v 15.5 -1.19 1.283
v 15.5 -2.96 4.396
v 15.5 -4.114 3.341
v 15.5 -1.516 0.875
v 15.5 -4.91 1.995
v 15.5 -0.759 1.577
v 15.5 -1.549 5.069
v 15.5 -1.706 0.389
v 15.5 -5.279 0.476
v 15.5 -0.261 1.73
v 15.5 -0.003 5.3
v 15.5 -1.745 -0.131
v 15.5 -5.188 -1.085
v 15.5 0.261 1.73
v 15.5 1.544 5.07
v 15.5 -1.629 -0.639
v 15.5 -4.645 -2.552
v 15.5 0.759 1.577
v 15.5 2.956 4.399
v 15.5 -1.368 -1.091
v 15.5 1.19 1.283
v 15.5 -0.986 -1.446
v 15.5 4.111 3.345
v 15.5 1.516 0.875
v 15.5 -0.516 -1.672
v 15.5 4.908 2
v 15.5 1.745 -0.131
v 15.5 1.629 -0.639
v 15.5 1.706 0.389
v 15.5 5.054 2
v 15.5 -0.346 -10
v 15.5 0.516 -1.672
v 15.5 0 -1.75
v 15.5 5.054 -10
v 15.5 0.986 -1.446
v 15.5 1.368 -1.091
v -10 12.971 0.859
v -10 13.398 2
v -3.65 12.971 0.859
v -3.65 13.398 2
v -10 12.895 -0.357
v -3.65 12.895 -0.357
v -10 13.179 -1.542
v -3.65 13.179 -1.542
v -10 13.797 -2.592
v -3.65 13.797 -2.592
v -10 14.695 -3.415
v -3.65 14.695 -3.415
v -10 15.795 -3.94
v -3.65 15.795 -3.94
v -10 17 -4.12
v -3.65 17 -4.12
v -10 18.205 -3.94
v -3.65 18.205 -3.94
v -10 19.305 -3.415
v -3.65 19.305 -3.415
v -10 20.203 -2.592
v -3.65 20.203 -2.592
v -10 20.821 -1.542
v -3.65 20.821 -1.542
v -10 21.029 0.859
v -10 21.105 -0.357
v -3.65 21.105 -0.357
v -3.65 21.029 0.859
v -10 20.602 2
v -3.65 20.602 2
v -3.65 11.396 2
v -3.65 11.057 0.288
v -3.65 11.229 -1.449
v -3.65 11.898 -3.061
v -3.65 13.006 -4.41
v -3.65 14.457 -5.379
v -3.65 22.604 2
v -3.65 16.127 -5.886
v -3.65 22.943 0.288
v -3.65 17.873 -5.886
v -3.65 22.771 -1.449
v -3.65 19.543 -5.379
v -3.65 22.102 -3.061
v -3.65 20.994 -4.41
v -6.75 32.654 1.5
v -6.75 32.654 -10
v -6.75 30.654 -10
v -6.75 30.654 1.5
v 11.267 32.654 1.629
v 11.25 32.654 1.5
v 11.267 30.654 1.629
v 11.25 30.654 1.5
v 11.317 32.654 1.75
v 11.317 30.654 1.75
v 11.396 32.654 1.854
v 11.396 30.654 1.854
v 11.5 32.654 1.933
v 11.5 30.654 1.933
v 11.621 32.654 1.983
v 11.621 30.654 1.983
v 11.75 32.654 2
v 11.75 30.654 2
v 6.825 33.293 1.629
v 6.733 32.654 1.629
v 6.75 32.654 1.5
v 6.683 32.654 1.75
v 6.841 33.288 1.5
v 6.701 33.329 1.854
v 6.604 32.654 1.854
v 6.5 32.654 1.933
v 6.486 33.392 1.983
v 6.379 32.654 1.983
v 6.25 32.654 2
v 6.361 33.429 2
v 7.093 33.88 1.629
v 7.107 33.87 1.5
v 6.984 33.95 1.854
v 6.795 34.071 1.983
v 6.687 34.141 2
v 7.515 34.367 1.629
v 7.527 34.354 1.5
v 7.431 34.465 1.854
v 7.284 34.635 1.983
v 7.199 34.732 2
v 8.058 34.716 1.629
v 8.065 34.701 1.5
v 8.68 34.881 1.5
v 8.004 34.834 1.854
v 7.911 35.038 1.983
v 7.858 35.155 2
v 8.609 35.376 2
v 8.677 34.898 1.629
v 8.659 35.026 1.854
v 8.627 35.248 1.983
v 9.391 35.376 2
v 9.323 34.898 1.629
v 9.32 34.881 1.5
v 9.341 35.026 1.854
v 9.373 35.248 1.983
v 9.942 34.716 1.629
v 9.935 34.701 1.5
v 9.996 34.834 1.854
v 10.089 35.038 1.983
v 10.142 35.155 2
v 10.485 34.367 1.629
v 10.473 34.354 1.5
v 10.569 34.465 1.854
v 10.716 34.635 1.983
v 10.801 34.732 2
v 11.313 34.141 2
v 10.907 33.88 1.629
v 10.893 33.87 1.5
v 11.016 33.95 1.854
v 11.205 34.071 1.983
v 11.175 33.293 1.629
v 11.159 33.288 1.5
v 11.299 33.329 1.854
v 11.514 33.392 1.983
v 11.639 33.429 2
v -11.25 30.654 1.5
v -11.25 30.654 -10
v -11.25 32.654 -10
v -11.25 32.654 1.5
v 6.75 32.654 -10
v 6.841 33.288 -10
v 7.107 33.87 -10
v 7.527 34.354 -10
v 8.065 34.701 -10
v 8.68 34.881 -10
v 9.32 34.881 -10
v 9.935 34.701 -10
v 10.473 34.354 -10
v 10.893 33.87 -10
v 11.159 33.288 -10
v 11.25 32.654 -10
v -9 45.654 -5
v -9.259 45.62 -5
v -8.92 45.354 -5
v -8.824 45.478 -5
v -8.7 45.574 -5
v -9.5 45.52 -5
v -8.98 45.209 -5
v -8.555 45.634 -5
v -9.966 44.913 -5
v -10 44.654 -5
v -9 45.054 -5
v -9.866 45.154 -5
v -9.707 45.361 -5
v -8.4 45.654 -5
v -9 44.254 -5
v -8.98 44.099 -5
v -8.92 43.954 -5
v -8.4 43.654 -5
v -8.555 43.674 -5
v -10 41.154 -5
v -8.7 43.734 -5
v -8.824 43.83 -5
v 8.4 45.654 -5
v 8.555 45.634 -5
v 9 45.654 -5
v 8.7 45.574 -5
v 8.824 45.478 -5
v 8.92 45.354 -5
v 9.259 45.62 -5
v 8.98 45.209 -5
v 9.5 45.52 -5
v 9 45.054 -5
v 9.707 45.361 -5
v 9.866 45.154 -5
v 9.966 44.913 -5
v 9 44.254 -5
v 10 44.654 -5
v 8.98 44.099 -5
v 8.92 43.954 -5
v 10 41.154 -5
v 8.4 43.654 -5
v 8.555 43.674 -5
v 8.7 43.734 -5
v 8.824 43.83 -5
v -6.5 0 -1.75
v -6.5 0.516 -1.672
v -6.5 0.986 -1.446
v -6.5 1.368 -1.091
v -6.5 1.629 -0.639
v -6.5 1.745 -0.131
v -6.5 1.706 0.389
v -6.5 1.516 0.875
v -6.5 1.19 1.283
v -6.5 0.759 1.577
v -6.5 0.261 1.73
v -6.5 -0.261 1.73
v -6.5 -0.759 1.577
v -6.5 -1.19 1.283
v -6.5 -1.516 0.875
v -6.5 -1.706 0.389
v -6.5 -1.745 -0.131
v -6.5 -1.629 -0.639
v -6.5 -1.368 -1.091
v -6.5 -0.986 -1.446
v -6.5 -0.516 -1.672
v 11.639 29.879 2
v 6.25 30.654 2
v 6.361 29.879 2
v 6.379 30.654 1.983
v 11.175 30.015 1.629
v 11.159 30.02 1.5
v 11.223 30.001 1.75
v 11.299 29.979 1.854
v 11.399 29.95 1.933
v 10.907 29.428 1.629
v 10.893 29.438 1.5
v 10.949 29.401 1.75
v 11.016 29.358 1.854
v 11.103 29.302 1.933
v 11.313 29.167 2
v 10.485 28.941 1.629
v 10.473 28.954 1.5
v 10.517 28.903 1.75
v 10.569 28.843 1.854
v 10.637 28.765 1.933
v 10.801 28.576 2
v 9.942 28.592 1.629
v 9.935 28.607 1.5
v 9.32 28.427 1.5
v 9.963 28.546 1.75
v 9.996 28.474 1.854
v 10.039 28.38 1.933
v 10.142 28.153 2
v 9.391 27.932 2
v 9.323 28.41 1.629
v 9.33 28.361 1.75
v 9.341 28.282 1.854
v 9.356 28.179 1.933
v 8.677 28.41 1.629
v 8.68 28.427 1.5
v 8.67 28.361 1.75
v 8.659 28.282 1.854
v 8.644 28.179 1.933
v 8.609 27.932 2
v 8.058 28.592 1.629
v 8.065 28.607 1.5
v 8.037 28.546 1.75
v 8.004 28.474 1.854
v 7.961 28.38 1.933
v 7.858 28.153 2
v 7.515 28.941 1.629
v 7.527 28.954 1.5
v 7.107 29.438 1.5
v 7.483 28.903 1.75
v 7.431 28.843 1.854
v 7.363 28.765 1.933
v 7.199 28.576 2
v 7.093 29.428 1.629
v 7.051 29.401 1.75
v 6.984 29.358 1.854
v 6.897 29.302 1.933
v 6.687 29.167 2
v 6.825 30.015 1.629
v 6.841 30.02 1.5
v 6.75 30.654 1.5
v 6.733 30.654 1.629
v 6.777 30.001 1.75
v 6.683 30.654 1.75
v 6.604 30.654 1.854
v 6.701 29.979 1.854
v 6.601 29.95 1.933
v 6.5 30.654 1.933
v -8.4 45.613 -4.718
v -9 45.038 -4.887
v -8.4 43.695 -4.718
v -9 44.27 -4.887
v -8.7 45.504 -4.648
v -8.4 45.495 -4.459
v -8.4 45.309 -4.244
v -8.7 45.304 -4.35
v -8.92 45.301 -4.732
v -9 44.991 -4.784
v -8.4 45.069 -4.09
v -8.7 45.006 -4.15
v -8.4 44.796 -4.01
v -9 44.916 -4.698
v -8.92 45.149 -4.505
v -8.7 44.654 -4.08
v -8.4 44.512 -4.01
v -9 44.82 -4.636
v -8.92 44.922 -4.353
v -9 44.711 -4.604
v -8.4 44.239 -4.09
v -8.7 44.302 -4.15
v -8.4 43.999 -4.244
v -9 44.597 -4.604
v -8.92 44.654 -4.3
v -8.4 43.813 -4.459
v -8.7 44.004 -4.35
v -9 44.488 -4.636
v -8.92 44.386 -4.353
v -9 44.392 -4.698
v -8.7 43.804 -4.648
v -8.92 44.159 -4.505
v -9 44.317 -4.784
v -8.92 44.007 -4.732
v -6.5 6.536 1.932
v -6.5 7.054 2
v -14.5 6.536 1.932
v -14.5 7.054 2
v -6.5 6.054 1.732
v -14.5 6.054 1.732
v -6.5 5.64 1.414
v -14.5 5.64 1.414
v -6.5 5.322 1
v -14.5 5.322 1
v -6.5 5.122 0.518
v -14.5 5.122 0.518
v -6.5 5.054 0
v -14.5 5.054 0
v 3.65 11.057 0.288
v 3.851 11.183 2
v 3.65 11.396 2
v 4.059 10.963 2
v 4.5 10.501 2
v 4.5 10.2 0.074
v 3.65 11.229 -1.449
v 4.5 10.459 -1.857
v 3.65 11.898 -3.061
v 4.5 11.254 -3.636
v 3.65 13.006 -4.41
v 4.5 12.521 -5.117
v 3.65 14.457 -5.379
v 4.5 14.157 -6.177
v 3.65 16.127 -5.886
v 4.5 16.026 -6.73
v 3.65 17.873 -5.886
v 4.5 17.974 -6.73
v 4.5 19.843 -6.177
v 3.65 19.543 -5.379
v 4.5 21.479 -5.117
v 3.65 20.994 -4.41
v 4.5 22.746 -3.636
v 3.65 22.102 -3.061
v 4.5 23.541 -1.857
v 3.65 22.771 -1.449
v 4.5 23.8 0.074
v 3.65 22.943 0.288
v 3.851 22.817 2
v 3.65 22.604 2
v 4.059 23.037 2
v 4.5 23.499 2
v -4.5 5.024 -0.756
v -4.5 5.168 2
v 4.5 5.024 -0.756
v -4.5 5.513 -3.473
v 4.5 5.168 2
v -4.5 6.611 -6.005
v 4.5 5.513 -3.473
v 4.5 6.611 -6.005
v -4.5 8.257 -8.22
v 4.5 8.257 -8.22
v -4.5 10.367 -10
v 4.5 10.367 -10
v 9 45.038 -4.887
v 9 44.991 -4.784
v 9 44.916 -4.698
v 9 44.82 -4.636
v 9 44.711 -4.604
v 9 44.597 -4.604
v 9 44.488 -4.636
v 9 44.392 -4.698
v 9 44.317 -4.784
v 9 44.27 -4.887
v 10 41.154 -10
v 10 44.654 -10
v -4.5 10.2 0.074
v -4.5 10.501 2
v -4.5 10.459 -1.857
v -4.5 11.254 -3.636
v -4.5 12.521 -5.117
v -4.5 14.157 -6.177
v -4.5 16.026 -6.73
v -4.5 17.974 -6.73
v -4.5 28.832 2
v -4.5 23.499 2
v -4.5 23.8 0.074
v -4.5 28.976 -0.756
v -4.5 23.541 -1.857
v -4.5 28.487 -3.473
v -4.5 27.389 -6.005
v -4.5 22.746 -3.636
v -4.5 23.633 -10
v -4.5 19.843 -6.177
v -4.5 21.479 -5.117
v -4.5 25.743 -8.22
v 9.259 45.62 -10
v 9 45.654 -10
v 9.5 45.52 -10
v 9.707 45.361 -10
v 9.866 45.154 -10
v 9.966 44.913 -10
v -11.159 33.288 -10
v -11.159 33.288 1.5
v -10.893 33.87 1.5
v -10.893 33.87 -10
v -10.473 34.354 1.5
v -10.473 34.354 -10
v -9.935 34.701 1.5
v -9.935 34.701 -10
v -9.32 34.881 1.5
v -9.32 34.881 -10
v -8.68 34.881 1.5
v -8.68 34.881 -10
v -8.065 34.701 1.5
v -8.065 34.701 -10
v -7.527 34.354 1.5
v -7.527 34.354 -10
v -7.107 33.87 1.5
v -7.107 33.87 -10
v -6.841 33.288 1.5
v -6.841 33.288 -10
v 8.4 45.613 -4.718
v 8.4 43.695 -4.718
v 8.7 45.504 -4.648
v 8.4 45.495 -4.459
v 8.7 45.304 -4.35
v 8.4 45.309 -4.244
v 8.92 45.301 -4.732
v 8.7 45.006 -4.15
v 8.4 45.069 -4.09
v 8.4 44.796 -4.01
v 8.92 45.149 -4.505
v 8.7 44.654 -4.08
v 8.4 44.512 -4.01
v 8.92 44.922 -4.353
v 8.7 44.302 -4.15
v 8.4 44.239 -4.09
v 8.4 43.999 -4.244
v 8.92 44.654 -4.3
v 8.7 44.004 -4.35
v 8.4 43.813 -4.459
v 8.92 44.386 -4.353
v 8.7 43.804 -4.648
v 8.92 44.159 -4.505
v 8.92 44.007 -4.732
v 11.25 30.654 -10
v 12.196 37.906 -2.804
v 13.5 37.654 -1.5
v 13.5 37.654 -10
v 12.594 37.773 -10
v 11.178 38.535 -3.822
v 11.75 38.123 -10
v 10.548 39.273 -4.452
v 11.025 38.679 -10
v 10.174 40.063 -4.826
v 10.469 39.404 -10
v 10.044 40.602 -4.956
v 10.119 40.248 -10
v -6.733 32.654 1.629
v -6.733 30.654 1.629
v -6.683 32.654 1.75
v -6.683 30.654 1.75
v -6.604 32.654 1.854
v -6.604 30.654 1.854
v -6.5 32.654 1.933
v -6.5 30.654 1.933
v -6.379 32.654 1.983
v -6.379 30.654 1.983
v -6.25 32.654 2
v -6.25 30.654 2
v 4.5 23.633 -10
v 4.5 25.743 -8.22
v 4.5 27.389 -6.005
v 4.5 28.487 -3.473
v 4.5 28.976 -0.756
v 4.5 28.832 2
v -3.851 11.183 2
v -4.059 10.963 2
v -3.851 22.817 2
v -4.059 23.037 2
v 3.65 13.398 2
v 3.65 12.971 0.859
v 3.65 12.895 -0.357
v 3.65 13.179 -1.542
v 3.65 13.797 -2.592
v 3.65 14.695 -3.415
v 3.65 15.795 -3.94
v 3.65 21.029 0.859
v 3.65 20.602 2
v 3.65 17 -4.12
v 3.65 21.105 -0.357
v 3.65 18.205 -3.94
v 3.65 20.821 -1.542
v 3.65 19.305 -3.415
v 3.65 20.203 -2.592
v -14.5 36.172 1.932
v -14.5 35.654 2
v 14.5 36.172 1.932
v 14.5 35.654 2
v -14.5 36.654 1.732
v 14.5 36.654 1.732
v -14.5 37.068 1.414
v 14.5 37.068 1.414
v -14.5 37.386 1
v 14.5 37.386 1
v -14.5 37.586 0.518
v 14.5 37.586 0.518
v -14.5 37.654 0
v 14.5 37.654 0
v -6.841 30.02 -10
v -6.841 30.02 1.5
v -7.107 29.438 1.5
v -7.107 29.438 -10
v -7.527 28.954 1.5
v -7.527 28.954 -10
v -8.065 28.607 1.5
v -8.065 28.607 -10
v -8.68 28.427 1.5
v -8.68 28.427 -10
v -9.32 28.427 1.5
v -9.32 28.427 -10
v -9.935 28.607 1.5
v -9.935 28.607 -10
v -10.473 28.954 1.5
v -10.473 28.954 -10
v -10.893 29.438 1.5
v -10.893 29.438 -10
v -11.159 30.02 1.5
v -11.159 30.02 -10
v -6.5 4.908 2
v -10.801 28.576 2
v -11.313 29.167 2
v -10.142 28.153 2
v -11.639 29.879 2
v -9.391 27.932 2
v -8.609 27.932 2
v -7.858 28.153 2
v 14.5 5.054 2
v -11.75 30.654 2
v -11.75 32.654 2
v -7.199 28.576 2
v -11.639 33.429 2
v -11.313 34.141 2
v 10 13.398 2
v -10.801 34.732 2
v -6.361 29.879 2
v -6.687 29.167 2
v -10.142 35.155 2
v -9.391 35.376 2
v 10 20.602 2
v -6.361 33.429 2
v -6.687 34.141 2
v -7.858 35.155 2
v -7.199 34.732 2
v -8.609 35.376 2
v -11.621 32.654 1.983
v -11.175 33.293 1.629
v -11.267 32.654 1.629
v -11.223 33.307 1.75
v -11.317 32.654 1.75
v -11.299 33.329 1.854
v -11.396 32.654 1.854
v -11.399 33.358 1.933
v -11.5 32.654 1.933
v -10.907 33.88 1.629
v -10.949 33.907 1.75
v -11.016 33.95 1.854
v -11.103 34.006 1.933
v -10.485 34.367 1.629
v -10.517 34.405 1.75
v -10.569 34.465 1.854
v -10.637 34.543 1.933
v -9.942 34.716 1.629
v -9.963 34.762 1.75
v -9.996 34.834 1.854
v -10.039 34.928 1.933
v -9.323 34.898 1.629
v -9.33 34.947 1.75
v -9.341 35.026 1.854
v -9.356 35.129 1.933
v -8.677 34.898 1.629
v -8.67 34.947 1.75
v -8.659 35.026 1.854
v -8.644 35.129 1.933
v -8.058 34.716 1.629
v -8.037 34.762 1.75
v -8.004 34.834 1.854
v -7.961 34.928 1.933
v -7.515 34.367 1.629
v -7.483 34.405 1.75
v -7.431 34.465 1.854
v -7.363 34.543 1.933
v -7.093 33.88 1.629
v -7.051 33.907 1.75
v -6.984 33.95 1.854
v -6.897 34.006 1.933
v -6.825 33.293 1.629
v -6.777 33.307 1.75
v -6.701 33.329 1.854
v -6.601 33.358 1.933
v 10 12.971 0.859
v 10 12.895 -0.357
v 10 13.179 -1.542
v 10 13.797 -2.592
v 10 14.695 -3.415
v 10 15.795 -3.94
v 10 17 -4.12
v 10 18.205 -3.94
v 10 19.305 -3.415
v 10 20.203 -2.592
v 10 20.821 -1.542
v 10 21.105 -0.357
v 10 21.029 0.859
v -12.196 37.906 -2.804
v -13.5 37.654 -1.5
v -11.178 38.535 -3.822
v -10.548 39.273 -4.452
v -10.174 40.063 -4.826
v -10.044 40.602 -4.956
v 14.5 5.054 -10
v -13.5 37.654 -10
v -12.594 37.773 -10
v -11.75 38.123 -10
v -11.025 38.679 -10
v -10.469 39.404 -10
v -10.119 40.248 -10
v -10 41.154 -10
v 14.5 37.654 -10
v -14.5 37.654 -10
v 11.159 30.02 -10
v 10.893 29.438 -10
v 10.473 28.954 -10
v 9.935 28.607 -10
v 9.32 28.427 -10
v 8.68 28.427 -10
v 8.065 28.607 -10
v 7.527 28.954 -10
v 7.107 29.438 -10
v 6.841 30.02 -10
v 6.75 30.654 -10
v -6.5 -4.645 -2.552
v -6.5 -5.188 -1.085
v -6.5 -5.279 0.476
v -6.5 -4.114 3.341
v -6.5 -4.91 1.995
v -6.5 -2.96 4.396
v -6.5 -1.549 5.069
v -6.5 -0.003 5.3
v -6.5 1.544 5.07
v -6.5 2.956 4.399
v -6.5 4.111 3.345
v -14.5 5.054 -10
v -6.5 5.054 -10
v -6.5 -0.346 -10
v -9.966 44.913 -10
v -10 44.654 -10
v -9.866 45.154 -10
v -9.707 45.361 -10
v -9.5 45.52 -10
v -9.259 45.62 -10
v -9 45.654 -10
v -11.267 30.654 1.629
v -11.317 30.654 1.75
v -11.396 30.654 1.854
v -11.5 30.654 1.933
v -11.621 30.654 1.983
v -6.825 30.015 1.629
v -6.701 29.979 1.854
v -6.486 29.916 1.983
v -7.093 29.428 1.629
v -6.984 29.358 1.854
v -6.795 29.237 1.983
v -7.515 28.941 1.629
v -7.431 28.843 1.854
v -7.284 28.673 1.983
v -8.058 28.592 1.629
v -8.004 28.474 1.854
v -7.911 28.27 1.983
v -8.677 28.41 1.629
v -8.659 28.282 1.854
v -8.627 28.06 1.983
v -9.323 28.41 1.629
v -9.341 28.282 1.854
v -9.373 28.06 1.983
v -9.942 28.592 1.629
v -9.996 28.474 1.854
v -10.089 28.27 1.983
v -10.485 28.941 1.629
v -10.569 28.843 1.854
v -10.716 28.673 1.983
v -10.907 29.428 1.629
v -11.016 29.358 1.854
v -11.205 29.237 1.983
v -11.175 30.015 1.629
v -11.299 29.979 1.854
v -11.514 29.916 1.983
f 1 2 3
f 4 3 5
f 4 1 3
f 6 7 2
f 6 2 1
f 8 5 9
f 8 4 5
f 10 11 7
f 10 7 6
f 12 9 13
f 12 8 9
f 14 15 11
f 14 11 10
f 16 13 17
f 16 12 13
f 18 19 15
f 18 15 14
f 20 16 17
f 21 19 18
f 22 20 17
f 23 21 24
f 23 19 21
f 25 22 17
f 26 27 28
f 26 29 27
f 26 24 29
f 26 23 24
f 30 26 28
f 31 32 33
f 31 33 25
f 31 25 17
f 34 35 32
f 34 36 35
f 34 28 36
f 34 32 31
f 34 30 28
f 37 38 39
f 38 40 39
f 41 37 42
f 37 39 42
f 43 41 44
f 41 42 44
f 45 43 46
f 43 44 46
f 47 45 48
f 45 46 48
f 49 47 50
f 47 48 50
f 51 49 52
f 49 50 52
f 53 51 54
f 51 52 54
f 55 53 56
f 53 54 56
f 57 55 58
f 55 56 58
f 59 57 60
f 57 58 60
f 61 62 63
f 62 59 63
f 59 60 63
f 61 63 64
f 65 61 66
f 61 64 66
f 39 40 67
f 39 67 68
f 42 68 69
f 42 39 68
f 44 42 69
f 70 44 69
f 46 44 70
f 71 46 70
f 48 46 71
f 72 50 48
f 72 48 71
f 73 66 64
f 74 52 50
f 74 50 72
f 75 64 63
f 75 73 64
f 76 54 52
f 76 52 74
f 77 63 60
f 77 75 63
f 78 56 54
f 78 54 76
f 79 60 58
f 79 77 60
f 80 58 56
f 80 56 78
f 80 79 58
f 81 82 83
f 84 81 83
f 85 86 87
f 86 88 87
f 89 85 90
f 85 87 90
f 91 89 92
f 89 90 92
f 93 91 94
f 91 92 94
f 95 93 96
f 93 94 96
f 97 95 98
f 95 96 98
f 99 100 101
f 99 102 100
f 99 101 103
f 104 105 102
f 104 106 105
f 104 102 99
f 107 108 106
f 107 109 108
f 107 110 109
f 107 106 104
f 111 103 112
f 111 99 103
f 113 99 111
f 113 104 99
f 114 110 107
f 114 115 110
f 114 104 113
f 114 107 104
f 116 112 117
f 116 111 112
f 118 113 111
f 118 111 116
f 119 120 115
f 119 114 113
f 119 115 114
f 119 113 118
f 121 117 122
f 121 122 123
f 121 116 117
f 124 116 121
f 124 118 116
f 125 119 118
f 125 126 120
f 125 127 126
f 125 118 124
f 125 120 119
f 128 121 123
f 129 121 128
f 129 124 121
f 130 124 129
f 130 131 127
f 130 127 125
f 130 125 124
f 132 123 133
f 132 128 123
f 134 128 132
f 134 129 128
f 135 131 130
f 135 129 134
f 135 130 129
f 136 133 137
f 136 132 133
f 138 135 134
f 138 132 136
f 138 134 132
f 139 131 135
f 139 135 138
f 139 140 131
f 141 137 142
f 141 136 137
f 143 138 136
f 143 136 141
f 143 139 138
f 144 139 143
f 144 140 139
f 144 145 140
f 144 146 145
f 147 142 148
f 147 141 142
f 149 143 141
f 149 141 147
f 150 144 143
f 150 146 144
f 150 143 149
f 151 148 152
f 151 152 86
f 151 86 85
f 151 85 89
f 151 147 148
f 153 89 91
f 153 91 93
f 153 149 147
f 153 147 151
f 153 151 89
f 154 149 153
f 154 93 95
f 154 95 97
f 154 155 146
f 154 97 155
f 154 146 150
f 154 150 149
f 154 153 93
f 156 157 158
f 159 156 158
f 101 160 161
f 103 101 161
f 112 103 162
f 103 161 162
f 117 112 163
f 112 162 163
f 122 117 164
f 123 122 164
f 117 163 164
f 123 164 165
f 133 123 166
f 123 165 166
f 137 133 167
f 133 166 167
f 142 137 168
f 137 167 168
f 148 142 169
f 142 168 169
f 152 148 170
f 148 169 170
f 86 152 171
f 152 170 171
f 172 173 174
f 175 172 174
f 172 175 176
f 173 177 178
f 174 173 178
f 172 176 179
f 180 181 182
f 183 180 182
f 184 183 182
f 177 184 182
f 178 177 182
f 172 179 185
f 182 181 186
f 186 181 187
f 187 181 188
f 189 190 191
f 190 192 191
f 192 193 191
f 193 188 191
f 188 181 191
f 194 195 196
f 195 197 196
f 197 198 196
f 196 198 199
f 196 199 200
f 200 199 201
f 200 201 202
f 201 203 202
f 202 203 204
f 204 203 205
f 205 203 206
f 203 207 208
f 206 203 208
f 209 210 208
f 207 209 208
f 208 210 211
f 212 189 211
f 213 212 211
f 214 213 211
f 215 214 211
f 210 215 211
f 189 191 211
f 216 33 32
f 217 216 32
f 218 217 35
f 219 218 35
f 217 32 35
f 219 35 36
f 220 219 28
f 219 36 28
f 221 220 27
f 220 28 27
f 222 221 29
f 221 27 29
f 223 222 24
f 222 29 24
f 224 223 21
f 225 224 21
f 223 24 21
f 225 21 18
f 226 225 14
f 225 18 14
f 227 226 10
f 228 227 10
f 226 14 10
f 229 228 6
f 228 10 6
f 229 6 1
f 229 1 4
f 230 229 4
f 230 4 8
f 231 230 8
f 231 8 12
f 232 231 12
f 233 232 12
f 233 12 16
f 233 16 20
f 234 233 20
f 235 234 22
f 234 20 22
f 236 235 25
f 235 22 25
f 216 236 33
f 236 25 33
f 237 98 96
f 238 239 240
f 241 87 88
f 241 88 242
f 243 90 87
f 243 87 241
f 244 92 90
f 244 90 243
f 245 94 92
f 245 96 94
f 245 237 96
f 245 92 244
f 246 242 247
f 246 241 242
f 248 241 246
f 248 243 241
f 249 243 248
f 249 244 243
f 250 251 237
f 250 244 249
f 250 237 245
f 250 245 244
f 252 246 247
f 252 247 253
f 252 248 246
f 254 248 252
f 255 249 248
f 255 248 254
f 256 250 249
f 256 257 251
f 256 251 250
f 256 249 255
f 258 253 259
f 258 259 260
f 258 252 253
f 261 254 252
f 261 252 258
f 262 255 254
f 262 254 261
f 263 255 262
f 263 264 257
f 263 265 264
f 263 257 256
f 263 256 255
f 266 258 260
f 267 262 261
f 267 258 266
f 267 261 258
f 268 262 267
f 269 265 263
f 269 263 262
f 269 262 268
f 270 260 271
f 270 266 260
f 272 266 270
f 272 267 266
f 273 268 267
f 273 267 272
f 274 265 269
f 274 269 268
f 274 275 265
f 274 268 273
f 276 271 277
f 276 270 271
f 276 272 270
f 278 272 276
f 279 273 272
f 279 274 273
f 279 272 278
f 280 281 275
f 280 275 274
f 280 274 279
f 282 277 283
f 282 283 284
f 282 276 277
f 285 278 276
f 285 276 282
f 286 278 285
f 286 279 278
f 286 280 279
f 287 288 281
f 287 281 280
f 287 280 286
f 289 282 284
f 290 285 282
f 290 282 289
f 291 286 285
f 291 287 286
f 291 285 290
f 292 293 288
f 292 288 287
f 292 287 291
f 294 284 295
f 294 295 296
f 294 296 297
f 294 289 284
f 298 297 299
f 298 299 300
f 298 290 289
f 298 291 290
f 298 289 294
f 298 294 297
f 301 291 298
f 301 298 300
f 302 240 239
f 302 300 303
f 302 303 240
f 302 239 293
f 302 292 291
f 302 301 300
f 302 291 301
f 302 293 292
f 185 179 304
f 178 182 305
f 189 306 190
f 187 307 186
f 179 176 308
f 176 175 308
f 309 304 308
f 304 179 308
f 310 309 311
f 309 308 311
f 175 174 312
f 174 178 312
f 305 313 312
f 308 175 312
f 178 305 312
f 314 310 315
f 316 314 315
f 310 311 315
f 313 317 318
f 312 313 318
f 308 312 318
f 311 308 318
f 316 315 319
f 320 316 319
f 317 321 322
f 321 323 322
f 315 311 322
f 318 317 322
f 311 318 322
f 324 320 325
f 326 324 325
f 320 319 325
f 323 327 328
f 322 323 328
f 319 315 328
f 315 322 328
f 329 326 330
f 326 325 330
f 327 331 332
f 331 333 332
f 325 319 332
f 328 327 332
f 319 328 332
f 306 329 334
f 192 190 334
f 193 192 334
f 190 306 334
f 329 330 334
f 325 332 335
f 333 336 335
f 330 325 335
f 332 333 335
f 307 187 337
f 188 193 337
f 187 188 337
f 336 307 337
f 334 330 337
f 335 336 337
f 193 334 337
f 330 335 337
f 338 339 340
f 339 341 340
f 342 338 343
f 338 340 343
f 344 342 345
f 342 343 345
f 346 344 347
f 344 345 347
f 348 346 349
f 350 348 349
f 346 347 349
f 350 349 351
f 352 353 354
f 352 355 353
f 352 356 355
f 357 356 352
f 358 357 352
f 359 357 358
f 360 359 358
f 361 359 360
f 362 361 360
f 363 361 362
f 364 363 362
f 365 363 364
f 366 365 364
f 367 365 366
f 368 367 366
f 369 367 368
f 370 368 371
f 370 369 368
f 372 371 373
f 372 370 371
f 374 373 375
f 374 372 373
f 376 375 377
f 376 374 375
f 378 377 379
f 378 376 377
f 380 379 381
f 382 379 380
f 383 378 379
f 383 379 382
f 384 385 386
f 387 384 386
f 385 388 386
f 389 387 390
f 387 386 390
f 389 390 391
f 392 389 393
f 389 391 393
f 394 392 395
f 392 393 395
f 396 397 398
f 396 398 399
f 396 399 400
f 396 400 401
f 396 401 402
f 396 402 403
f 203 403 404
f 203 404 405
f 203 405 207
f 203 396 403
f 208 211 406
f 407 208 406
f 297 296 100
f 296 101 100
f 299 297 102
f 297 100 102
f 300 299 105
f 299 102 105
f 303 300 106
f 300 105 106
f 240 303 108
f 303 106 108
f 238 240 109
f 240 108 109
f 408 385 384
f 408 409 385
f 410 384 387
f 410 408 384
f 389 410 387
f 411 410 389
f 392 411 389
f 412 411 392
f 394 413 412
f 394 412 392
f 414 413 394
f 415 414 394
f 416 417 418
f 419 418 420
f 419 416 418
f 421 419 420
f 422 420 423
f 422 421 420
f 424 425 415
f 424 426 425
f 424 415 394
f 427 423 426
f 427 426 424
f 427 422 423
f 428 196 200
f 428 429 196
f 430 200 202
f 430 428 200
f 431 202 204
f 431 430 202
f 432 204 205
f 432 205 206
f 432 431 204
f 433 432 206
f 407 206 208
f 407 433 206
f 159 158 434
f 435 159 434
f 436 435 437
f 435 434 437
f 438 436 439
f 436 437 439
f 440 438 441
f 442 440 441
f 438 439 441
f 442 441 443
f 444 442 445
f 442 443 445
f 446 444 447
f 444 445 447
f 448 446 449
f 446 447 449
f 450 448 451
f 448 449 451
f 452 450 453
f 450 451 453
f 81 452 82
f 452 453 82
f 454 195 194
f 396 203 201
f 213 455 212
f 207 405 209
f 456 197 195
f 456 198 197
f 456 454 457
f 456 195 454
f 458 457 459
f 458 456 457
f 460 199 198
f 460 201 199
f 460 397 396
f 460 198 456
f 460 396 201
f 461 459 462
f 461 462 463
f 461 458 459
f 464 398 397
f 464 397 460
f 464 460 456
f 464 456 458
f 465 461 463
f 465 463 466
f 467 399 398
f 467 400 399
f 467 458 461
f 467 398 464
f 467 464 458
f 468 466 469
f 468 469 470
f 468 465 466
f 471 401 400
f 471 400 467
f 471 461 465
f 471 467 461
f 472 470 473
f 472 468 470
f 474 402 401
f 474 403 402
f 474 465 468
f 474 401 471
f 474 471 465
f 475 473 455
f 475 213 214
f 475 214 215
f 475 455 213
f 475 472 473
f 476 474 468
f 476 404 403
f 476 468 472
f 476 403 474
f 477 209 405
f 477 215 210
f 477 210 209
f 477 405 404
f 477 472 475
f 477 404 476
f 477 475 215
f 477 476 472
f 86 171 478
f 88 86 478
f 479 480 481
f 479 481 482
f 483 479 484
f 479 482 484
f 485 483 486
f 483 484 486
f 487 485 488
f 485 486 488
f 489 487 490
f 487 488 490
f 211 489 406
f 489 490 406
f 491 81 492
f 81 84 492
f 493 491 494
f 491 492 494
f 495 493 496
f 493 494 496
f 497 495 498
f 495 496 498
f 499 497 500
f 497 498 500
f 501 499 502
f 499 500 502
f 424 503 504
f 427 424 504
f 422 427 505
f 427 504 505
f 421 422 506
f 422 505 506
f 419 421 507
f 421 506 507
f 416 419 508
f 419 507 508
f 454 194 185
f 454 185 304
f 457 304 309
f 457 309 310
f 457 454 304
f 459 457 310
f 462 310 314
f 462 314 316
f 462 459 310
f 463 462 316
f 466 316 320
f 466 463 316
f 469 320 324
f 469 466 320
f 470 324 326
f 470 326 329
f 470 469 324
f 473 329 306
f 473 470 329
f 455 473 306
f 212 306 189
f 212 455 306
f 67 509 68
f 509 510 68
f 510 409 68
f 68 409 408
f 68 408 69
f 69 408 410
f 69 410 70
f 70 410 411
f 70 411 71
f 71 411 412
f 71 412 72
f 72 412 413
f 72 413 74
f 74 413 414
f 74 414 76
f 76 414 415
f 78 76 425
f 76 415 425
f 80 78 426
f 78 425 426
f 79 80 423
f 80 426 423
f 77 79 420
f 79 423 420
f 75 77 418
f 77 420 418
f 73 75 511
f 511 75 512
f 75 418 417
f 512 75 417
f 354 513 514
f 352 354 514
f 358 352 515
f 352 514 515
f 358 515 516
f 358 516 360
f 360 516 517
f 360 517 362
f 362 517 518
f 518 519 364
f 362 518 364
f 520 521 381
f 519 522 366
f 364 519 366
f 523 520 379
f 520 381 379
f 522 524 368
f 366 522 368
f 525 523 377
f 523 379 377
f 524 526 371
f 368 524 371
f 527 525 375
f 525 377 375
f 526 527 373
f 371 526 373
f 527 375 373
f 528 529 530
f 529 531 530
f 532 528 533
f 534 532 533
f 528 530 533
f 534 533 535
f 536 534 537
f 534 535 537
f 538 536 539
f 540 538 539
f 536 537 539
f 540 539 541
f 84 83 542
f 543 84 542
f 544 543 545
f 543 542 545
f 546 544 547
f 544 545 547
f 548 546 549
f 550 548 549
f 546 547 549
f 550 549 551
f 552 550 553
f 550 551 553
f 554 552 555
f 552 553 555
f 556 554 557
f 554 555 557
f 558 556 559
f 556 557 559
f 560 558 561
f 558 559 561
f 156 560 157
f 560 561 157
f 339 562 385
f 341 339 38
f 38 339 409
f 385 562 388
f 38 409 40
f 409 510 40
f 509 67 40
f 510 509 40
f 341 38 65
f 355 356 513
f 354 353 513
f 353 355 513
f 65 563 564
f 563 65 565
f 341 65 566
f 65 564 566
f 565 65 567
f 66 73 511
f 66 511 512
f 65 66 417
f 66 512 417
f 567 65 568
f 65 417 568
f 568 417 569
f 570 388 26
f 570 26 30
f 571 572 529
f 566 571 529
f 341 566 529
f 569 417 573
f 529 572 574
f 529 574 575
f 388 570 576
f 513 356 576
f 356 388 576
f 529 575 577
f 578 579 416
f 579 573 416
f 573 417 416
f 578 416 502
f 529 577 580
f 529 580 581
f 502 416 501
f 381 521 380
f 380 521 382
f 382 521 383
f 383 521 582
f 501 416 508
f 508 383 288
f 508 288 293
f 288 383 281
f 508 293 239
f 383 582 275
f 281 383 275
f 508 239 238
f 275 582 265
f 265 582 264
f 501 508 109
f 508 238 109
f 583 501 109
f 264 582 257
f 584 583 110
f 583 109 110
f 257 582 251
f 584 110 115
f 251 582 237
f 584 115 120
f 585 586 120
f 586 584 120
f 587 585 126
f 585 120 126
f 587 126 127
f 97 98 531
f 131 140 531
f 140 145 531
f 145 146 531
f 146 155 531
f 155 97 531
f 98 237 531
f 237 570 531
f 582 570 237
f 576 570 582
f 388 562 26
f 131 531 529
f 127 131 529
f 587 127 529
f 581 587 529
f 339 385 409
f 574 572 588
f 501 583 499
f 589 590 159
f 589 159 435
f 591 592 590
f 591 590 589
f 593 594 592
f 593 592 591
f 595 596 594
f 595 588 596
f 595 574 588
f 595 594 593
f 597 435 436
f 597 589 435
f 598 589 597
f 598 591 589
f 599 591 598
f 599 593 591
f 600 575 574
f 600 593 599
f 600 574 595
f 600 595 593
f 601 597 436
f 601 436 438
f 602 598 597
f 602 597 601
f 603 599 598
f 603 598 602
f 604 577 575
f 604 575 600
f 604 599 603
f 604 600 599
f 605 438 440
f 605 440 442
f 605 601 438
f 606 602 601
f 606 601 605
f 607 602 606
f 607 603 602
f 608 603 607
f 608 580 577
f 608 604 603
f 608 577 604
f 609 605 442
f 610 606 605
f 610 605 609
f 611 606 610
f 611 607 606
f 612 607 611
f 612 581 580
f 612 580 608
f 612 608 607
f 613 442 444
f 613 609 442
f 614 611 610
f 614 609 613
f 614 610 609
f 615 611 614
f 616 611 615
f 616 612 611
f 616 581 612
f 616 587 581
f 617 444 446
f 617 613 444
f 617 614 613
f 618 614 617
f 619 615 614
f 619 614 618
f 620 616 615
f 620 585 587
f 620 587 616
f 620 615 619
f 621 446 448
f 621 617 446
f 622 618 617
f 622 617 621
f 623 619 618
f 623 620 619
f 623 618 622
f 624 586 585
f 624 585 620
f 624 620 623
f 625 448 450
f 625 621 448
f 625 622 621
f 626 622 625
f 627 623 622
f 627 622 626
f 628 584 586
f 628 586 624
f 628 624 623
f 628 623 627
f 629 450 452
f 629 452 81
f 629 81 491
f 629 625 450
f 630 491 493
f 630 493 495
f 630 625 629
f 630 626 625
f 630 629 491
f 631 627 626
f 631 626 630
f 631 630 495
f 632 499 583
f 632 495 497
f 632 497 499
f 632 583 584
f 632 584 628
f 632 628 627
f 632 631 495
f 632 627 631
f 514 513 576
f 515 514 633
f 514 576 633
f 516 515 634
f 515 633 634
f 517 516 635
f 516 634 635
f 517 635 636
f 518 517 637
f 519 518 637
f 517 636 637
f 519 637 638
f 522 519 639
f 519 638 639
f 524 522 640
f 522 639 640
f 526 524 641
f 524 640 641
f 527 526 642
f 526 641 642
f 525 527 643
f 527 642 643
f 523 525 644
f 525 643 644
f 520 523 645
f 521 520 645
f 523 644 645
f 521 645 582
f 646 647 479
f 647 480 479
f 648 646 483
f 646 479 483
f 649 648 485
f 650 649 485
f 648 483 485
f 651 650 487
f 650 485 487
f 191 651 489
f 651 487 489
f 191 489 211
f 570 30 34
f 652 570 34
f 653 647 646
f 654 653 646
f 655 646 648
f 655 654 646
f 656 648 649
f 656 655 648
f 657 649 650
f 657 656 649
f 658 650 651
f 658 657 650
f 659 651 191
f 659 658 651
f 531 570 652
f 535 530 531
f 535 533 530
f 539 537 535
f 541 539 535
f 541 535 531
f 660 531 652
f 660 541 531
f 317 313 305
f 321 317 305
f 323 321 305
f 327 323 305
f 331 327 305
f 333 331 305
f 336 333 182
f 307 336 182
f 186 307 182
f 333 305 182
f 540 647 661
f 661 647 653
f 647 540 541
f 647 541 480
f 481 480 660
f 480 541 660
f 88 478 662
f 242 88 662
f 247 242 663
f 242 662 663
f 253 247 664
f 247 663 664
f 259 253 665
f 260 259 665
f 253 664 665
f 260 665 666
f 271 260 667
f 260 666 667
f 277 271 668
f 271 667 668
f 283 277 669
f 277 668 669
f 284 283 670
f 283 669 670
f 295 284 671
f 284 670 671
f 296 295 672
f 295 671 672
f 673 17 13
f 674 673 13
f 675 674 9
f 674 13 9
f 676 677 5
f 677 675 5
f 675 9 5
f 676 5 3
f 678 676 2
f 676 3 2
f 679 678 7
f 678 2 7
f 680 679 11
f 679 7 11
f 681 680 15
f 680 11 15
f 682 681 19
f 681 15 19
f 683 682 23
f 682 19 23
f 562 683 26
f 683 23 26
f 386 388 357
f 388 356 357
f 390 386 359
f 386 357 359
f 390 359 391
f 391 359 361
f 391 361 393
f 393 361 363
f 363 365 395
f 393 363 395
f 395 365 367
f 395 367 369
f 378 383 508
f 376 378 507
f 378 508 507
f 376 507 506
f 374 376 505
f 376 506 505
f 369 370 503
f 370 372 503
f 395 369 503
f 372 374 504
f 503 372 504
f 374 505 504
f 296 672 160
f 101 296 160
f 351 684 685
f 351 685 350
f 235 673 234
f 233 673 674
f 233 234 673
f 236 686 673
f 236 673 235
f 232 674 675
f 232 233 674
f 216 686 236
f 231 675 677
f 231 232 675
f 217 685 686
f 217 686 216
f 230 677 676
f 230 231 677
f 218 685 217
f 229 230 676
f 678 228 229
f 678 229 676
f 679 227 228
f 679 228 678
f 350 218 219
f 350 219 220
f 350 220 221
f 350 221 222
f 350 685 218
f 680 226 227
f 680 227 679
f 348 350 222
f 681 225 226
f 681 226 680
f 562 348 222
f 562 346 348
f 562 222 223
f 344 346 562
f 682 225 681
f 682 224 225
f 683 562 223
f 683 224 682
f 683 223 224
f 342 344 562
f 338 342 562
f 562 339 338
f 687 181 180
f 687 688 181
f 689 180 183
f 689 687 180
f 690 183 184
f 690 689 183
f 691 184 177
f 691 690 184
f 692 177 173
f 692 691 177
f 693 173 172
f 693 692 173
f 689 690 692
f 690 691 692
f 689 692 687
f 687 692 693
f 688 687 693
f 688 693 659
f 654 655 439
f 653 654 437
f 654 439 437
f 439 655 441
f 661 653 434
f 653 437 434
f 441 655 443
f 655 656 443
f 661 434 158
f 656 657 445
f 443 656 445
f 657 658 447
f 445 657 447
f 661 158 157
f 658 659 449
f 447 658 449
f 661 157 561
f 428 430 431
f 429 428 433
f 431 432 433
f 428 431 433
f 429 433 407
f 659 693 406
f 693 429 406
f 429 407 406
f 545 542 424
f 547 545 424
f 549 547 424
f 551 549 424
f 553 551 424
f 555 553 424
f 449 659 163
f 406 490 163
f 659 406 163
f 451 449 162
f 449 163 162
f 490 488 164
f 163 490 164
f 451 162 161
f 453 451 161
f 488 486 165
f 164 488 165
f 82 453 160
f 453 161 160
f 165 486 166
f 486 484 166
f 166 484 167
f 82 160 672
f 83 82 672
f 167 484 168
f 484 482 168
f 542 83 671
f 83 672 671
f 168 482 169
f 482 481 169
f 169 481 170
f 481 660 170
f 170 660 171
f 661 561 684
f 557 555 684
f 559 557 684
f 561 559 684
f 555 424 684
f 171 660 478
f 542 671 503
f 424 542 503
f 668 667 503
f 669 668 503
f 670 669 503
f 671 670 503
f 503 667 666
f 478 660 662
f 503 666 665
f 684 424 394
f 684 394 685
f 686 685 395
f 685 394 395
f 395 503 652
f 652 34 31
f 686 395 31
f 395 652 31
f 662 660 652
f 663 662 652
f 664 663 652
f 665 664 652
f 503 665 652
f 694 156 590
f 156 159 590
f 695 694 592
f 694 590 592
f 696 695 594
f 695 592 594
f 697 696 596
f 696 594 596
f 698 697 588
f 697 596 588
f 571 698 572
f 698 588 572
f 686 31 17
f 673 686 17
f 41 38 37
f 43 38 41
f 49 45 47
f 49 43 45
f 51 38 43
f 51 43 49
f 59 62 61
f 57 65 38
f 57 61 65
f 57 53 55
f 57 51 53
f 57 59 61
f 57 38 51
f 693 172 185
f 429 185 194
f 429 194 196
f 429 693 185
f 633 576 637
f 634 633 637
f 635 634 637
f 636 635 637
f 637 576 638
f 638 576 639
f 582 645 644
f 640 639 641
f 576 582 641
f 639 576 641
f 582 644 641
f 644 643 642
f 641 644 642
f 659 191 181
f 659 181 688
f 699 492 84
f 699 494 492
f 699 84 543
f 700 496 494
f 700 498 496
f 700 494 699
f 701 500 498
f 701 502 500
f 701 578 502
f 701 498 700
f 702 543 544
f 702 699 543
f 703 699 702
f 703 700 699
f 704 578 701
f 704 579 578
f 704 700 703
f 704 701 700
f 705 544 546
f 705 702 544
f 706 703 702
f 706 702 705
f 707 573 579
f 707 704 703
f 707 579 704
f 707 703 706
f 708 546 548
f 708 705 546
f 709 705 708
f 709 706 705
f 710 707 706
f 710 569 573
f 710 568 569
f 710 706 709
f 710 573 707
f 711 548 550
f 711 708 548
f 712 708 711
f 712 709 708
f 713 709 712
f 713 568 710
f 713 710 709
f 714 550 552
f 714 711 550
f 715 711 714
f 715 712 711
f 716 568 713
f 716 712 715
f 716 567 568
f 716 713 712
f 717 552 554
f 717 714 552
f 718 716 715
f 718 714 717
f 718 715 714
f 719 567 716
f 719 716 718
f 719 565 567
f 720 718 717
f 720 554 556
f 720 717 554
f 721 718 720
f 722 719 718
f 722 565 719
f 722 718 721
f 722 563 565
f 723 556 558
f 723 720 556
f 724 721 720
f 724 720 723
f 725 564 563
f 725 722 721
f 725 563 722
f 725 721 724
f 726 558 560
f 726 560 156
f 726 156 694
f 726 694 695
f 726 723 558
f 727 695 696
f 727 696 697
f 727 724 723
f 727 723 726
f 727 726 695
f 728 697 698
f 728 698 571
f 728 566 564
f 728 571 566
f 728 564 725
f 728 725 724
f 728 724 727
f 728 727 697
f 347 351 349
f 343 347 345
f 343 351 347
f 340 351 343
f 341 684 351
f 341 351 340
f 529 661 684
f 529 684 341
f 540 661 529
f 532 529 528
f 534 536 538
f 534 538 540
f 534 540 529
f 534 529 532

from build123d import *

# Parameters (mm, degrees)
BOSS_EXTRUDE1_DEPTH = 16
SKETCH2_R           = 12
CUT_EXTRUDE1_DEPTH  = 4.5
SKETCH6_R           = 1.75
CUT_EXTRUDE4_DEPTH  = 17.5
BOSS_EXTRUDE2_DEPTH = 0.85
BOSS_EXTRUDE3_START = 0.85
BOSS_EXTRUDE3_DEPTH = 0.85
SKETCH3_R           = 4.12
BEARING_AXIS_DEPTH  = 10
CHAMFER1_SIZE       = 0.85
SKETCH15_W          = 20
SKETCH15_H          = 5
BOSS_EXTRUDE4_DEPTH = 8
FILLET1_R           = 3.5
FILLET3_R           = 1
SKETCH16_R          = 1
BOSS_EXTRUDE5_DEPTH = 9
FILLET4_R           = 0.6
CUT_EXTRUDE8_DEPTH  = 12
FILLET6_R           = 0.5
SKETCH19_W          = 12
SKETCH19_H          = 32.6
CUT_EXTRUDE9_DEPTH  = 1.5
SKETCH20_W          = 12
SKETCH20_H          = 32.6
CUT_EXTRUDE10_DEPTH = 1.5
SKETCH21_W          = 16.964448298
SKETCH21_H          = 10.992811929
CUT_EXTRUDE11_DEPTH = 9.5
SKETCH22_W          = 17.37165941
SKETCH22_H          = 11.278055293
CUT_EXTRUDE12_DEPTH = 0.5
FILLET7_R           = 2


with BuildPart() as part:
    # Sketch1 → Boss-Extrude1 (new, symmetric)
    with BuildSketch(Plane(origin=(0, 0, 0), x_dir=(0, 0, -1), z_dir=(1, 0, 0))):
        with BuildLine():
            Line((10, -0.346), (2.551698211, -4.645302599))
            ThreePointArc((2.551698211, -4.645302599), (-4.784687849, -2.279640803), (-2, 4.908156477))
            Line((-2, 4.908156477), (-2, 37.654))
            Line((-2, 37.654), (10, 37.654))
            Line((10, 37.654), (10, -0.346))
        make_face()
    extrude(amount=BOSS_EXTRUDE1_DEPTH, both=True)

    # Sketch2 → Cut-Extrude1 (cut, symmetric)
    with BuildSketch(Plane(origin=(0, 0, 0), x_dir=(0, 0, -1), z_dir=(1, 0, 0))):
        with Locations((0, 17)):
            Circle(SKETCH2_R)
    extrude(amount=CUT_EXTRUDE1_DEPTH, both=True, mode=Mode.SUBTRACT)

    # Sketch6 → Cut-Extrude4 (cut, symmetric)
    with BuildSketch(Plane(origin=(0, 0, 0), x_dir=(0, 0, -1), z_dir=(1, 0, 0))):
        Circle(SKETCH6_R)
    extrude(amount=CUT_EXTRUDE4_DEPTH, both=True, mode=Mode.SUBTRACT)

    # Sketch8 → Boss-Extrude2 (add)
    with BuildSketch(Plane(origin=(-4.5, 0, 0), x_dir=(0, 0, -1), z_dir=(1, 0, 0))):
        with BuildLine():
            Line((-2, 23.499230724), (-2, 10.500769276))
            ThreePointArc((-2, 10.500769276), (6.8, 17), (-2, 23.499230724))
        make_face()
    extrude(amount=BOSS_EXTRUDE2_DEPTH)

    # Sketch9 → Boss-Extrude3 (add)
    with BuildSketch(Plane.ZY.offset(-4.5).offset(BOSS_EXTRUDE3_START)):
        with BuildLine():
            Line((2, 23.499230724), (2, 10.500769276))
            ThreePointArc((2, 10.500769276), (-6.8, 17), (2, 23.499230724))
        make_face()
    extrude(amount=-BOSS_EXTRUDE3_DEPTH)

    # Sketch3 → bearing_axis (cut, symmetric)
    with BuildSketch(Plane(origin=(0, 0, 0), x_dir=(0, 0, -1), z_dir=(1, 0, 0))):
        with Locations((0, 17)):
            Circle(SKETCH3_R)
    extrude(amount=BEARING_AXIS_DEPTH, both=True, mode=Mode.SUBTRACT)

    # Chamfer1
    chamfer1_edges = [part.edges().sort_by_distance(p)[0] for p in [
        (3.65, 17, -6.8),
        (-3.65, 17, -6.8),
    ]]
    chamfer(chamfer1_edges, length=CHAMFER1_SIZE - 0.0001)  # a hair under: the kernel refuses the full size

    # Sketch15 → Boss-Extrude4 (add)
    with BuildSketch(Plane(origin=(0, 37.654, 0), x_dir=(1, 0, 0), z_dir=(0, 1, 0))):
        with Locations((0, 7.5)):
            Rectangle(SKETCH15_W, SKETCH15_H)
    extrude(amount=BOSS_EXTRUDE4_DEPTH)

    # Fillet1
    fillet1_edges = [part.edges().sort_by_distance(p)[0] for p in [
        (0, 37.654, -5),
        (10, 37.654, -7.5),
        (-10, 37.654, -7.5),
    ]]
    fillet(fillet1_edges, radius=FILLET1_R)

    # Fillet3
    fillet3_edges = [part.edges().sort_by_distance(p)[0] for p in [
        (-10, 45.654, -7.5),
        (10, 45.654, -7.5),
    ]]
    fillet(fillet3_edges, radius=FILLET3_R)

    # Sketch16 → Boss-Extrude5 (add, symmetric)
    with BuildSketch(Plane(origin=(0, 0, 0), x_dir=(0, 0, -1), z_dir=(1, 0, 0))):
        with Locations((5, 44.654)):
            Circle(SKETCH16_R)
    extrude(amount=BOSS_EXTRUDE5_DEPTH, both=True)

    # Fillet4
    fillet4_edges = [part.edges().sort_by_distance(p)[0] for p in [
        (-9, 44.654, -4),
        (9, 44.654, -4),
    ]]
    fillet(fillet4_edges, radius=FILLET4_R)

    # Sketch18 → Cut-Extrude8 (cut)
    with BuildSketch(Plane.XY.offset(-10)):
        with BuildLine():
            Line((-11.25, 30.654), (-11.25, 32.654))
            ThreePointArc((-11.25, 32.654), (-9, 34.904), (-6.75, 32.654))
            Line((-6.75, 32.654), (-6.75, 30.654))
            ThreePointArc((-6.75, 30.654), (-9, 28.404), (-11.25, 30.654))
        make_face()
        with BuildLine():
            Line((11.25, 32.654), (11.25, 30.654))
            ThreePointArc((11.25, 30.654), (9, 28.404), (6.75, 30.654))
            Line((6.75, 30.654), (6.75, 32.654))
            ThreePointArc((6.75, 32.654), (9, 34.904), (11.25, 32.654))
        make_face()
    extrude(amount=CUT_EXTRUDE8_DEPTH, mode=Mode.SUBTRACT)

    # Fillet6
    fillet6_edges = [part.edges().sort_by_distance(p)[0] for p in [
        (-11.25, 31.654, 2),
        (-9, 34.904, 2),
        (-6.75, 31.654, 2),
        (-9, 28.404, 2),
        (11.25, 31.654, 2),
        (9, 28.404, 2),
        (6.75, 31.654, 2),
        (9, 34.904, 2),
    ]]
    fillet(fillet6_edges, radius=FILLET6_R)

    # Sketch19 → Cut-Extrude9 (cut)
    with BuildSketch(Plane(origin=(16, 0, 0), x_dir=(0, 0, -1), z_dir=(1, 0, 0))):
        with Locations((4, 21.354)):
            Rectangle(SKETCH19_W, SKETCH19_H)
    extrude(amount=-CUT_EXTRUDE9_DEPTH, mode=Mode.SUBTRACT)

    # Sketch20 → Cut-Extrude10 (cut)
    with BuildSketch(Plane.ZY.offset(16)):
        with Locations((-4, 21.354)):
            Rectangle(SKETCH20_W, SKETCH20_H)
    extrude(amount=-CUT_EXTRUDE10_DEPTH, mode=Mode.SUBTRACT)

    # Sketch21 → Cut-Extrude11 (cut)
    with BuildSketch(Plane.ZY.offset(16)):
        with Locations((-1.517775851, -0.442405965)):
            Rectangle(SKETCH21_W, SKETCH21_H)
    extrude(amount=-CUT_EXTRUDE11_DEPTH, mode=Mode.SUBTRACT)

    # Sketch22 → Cut-Extrude12 (cut)
    with BuildSketch(Plane(origin=(16, 0, 0), x_dir=(0, 0, -1), z_dir=(1, 0, 0))):
        with Locations((1.314170295, -0.585027646)):
            Rectangle(SKETCH22_W, SKETCH22_H)
    extrude(amount=-CUT_EXTRUDE12_DEPTH, mode=Mode.SUBTRACT)

    # Fillet7
    fillet7_edges = [part.edges().sort_by_distance(p)[0] for p in [
        (0, 37.654, 2),
        (-10.5, 5.054, 2),
    ]]
    fillet(fillet7_edges, radius=FILLET7_R)


solid = part.part
